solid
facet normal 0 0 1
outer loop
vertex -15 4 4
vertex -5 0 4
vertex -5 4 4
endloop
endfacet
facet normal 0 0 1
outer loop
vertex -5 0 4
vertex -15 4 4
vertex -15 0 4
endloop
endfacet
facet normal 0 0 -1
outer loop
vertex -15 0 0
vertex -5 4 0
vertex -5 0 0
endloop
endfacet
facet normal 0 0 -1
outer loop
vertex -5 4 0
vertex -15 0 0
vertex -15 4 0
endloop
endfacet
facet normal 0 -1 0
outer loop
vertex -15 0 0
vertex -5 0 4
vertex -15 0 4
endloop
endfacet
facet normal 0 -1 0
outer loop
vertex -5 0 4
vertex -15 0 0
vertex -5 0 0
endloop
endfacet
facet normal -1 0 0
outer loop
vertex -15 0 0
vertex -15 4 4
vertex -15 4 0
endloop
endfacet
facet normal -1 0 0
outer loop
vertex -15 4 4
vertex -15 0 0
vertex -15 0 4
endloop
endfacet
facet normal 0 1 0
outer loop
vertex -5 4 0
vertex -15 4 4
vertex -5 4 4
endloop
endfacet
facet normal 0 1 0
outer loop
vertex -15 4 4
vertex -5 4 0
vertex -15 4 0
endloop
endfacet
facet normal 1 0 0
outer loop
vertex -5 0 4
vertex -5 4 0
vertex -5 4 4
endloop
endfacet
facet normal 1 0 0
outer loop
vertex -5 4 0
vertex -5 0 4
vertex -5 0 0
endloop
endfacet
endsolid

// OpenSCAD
// Construct: mirror() across the X = 0 plane.
mirror([1, 0, 0]) translate([5, 0, 0]) cube([10, 4, 4]);
